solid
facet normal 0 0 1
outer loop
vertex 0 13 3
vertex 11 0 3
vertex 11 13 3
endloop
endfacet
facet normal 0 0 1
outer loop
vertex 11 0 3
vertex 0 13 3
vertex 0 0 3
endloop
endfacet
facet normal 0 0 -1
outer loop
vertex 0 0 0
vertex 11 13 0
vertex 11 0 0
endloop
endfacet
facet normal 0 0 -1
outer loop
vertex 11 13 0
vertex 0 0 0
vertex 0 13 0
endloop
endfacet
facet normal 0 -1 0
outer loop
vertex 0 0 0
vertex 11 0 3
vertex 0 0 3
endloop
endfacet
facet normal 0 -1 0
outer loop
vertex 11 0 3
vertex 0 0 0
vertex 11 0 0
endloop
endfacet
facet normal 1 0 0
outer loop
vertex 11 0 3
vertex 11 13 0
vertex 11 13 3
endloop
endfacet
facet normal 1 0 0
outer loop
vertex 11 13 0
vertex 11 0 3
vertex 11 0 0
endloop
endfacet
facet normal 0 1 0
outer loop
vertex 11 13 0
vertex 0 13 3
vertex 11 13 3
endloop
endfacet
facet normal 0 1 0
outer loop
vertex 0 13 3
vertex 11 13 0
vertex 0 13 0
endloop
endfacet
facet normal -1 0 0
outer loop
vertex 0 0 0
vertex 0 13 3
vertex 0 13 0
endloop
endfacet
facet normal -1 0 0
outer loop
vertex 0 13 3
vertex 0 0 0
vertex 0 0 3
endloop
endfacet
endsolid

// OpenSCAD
// Generated by SolidPython 1.0.1 on 2020-07-29 00:46:55


cube(size = [11, 13, 3]);
/***********************************************
*********      SolidPython code:      **********
************************************************
 
# import packages: SolidPython
from solid import *
from solid.utils import *
from itertools import chain, combinations, permutations


class Resize:

    def __init__(self, scad_file):
        self.scad_file = scad_file
        #self.scad_file = import_scad(scad_file)
        # cone/cylinder param:
        self.r1 = 0
        self.r2 = 0
        self.h = 0
        # rectangular prism param:
        self.w = 0
        self.l = 0
        # ellipse param:
        self.r = 0

    # import OpenScad code (file name corresponds to shape)


    # classify shape + parameters
    def assign(self, param1, param2, param3):
        if self.scad_file == 'cone.scad':
            self.r1 = param1
            self.r2 = param2
            self.h = param3
        elif self.scad_file == 'cylinder.scad':
            self.r1 = param1
            self.r2 = param2
            self.h = param3
        elif self.scad_file == 'rectangularPrism.scad':
            self.h = param1
            self.l = param2
            self.w = param3
        else:
            self.r = param1
            self.h = param2

    # resize parameters
    def iterate(self):
        x = range(3, 20, 2)
        i = 1
        if self.scad_file == 'cone.scad':
            tempList = list(permutations(x, 2))
            for temp in tempList:
                param1 = temp[0]
                param2 = temp[1]
                filepath = 'produced_scad_files/' + 'cone' + str(param1) + '_' + str(param2) + '_' + '.scad'
                scad_render_to_file(cylinder(h=param1, r1=param2, r2=0), filepath)

        elif self.scad_file == 'cylinder.scad':
            tempList = list(permutations(x, 3))
            for temp in tempList:
                param1 = temp[0]
                param2 = temp[1]
                filepath = 'produced_scad_files/' + 'cylinder' + str(param1) + '_' + str(param2) + '_' + '.scad'
                scad_render_to_file(cylinder(h=param1, r1=param2, r2=param2), filepath)

        elif self.scad_file == 'rectangularPrism.scad':
            tempList = list(permutations(x, 3))
            for temp in tempList:
                param1 = temp[0]
                param2 = temp[1]
                param3 = temp[2]
                filepath = 'produced_scad_files/' + 'rectangularPrism' + str(param1) + '_' + str(param2) + '_' + str(
                    param3) + '.scad'
                scad_render_to_file(cube(size=(param1, param2, param3)), filepath)

        elif self.scad_file == 'ellipse.scad':
            tempList = list(permutations(x, 4))
            for temp in tempList:
                param1 = temp[0]
                param2 = temp[1]
                param3 = temp[2]
                param4 = temp[3]
                filepath = 'produced_scad_files/' + 'ellipse' + str(param1) + '_' + str(param2) + '_' + str(param3) + '_' + str(param4) + '.scad'
                scad_render_to_file(scale([param1, param2, param3])(sphere(r=param4)), filepath)

    def render_to_scadfile(self):
        scad_render_to_file(scad, 'example.scad') 
 
************************************************/
